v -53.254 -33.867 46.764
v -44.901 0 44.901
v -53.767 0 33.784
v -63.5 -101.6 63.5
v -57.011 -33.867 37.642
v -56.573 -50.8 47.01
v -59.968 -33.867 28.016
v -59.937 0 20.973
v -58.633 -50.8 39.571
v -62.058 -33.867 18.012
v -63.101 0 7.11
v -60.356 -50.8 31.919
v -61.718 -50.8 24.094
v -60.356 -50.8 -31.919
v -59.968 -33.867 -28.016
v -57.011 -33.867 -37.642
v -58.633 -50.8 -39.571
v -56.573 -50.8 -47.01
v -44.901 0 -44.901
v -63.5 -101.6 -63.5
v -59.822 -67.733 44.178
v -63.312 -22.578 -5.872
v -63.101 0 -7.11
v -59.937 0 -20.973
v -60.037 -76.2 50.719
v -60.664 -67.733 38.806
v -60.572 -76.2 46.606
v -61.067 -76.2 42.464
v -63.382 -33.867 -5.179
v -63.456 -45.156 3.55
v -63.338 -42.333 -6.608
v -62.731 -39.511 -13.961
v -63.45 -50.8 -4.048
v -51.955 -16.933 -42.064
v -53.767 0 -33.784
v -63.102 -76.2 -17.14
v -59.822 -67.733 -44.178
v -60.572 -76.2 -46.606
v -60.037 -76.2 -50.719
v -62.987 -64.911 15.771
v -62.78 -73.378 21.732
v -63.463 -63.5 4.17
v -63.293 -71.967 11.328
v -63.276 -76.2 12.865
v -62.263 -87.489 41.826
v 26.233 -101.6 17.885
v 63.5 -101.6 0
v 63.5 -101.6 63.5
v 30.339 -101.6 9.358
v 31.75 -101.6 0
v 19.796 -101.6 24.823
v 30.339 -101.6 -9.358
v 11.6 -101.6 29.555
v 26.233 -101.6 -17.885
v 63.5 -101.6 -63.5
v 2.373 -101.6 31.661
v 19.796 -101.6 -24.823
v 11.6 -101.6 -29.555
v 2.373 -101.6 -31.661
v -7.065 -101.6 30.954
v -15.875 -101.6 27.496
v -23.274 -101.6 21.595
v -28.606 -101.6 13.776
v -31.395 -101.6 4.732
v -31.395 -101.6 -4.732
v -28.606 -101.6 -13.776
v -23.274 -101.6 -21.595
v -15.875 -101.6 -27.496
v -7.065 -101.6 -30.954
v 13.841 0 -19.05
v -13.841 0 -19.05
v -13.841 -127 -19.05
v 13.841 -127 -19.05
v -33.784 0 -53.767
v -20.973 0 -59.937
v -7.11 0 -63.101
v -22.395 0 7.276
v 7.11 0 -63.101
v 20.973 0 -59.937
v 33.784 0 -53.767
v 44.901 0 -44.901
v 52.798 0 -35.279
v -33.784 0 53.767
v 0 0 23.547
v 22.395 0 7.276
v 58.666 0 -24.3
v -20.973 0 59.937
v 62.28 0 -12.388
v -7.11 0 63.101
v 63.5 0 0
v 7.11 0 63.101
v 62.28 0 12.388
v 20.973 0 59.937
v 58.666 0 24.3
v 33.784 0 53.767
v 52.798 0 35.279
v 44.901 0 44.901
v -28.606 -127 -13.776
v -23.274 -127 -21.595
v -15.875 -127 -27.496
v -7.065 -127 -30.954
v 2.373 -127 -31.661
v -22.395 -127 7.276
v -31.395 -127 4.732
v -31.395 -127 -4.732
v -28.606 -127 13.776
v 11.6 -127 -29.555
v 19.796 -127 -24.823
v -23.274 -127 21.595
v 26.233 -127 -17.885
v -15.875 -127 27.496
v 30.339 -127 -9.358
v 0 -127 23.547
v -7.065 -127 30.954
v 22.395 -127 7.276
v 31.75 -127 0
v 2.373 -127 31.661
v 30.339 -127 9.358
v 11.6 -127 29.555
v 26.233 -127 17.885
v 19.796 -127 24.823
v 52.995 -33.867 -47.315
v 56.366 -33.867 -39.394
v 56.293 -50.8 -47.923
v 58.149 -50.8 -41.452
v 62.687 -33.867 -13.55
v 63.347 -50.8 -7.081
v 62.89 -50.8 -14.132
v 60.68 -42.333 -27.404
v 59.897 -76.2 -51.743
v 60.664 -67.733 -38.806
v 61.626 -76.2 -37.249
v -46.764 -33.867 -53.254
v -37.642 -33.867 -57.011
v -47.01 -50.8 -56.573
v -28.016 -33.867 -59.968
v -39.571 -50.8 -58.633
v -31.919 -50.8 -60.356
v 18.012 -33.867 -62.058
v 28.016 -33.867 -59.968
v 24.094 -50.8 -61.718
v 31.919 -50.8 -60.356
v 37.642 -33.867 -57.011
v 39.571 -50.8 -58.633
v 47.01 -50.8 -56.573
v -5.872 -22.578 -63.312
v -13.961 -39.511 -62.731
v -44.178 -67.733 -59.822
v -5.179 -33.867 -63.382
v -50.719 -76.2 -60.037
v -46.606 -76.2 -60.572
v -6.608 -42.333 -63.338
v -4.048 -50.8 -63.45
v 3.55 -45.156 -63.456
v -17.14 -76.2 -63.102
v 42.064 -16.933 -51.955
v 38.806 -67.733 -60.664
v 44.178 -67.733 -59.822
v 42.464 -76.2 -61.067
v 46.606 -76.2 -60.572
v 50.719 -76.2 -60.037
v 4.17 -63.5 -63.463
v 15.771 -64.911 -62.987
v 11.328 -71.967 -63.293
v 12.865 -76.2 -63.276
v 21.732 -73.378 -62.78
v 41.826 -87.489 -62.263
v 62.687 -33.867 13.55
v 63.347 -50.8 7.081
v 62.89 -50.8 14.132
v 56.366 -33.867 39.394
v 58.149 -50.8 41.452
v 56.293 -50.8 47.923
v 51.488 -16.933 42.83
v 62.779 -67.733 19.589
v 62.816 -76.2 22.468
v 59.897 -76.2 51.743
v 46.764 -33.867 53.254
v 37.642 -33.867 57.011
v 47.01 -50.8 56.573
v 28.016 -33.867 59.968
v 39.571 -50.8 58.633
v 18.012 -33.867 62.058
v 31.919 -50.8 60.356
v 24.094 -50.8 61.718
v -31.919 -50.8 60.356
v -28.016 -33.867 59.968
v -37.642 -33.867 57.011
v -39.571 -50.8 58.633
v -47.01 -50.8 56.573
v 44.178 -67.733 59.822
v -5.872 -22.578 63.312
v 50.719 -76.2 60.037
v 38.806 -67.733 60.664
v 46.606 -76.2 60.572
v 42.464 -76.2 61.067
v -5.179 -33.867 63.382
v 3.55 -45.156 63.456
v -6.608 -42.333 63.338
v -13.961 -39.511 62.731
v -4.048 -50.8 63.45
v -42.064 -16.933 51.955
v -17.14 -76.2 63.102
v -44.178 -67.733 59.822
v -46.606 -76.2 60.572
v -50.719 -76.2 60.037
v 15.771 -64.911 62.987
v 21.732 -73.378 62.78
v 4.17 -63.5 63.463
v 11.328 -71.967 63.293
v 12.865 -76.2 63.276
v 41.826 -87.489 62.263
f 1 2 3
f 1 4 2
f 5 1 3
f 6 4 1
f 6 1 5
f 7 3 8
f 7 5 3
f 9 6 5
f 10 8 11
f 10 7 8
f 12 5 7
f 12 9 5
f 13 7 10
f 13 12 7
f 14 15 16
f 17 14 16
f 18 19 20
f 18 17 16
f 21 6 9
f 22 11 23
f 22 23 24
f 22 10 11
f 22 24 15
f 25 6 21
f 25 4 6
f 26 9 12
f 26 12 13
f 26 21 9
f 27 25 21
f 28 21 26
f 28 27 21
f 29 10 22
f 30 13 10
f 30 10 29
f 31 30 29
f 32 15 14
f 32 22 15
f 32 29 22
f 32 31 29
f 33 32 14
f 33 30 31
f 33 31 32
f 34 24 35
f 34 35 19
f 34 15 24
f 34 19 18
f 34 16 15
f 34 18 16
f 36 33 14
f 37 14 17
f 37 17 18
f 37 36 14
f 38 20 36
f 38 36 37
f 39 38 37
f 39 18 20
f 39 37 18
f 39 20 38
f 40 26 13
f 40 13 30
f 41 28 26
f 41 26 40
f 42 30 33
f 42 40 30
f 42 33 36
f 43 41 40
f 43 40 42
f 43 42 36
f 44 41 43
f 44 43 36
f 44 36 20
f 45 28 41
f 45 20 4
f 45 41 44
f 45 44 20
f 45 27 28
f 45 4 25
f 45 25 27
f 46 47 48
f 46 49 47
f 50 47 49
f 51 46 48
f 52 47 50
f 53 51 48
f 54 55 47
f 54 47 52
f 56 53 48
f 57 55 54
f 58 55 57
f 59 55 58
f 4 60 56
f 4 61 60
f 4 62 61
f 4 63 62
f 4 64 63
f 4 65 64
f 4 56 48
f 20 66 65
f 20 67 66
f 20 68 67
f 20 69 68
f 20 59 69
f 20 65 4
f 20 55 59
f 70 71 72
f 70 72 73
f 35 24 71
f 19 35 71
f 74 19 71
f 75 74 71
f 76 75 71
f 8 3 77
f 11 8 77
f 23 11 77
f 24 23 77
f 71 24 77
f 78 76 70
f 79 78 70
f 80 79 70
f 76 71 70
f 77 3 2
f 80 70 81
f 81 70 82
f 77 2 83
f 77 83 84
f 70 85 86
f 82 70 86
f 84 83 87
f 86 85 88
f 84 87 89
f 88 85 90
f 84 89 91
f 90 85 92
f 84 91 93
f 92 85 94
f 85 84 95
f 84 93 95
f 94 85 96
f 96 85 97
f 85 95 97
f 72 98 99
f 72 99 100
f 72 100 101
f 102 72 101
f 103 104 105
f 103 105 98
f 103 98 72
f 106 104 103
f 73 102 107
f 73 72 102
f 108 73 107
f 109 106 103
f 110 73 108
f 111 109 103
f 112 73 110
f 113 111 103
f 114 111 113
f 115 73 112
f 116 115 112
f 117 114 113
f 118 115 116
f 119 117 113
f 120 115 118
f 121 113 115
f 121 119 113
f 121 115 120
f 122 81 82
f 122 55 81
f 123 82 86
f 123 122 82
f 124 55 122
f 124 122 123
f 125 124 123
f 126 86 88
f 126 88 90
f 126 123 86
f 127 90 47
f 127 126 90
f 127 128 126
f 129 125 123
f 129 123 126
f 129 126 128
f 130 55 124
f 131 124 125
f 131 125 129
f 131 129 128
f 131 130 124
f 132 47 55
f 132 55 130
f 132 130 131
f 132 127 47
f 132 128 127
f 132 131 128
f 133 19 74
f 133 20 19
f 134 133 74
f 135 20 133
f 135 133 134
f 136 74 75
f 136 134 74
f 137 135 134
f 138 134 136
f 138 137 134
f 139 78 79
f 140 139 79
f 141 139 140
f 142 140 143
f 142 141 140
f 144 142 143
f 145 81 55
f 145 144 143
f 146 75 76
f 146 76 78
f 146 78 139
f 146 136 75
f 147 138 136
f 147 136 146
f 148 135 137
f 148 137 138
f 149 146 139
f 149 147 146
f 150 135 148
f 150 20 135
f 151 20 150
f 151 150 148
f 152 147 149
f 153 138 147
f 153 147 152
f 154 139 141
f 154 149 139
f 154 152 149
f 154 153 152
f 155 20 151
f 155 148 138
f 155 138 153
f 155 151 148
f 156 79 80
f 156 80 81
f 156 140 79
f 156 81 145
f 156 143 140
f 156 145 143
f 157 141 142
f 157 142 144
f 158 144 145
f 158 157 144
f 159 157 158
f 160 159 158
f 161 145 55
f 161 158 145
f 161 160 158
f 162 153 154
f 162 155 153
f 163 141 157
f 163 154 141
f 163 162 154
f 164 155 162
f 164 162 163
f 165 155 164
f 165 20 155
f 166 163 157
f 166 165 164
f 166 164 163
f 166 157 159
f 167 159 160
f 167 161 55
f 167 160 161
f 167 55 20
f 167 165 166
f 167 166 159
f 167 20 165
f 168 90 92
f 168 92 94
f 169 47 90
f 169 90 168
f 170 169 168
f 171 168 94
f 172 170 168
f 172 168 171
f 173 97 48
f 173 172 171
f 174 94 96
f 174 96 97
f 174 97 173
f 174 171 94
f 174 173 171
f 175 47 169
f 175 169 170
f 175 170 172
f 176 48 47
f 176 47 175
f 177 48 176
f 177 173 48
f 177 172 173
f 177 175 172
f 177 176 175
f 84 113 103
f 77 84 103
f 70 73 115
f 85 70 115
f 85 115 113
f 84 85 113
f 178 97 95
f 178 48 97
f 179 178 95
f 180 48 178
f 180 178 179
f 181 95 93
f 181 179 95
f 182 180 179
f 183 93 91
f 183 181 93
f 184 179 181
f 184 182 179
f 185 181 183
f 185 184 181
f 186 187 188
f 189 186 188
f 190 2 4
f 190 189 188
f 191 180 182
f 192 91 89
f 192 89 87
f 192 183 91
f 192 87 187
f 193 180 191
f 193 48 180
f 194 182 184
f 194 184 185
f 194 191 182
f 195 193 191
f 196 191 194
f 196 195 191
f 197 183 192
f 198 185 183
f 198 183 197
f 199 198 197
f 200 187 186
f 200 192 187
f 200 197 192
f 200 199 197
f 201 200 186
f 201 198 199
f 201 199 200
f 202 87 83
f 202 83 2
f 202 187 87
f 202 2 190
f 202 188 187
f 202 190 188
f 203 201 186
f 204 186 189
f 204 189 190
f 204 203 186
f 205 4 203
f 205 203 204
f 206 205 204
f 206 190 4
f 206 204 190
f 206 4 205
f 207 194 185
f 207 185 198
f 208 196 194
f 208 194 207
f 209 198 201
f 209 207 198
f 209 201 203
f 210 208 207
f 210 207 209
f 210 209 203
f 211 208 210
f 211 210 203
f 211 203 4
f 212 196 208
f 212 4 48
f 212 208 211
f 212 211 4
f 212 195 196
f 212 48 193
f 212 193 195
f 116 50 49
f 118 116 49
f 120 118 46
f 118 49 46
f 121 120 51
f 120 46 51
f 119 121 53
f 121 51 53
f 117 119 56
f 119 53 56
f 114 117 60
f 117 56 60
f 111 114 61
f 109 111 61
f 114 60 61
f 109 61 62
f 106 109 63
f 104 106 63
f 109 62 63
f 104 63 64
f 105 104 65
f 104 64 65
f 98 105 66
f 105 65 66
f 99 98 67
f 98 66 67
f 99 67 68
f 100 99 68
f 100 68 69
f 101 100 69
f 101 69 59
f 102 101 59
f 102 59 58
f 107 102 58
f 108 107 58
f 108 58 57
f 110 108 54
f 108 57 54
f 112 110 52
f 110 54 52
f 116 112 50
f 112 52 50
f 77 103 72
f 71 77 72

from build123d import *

# Parameters (mm, degrees)
F0_R     = 63.5
F2_W     = 127
F2_H     = 127
F4_R     = 31.75
F5_DEPTH = 25.4
F7_DEPTH = 127


with BuildPart() as f3:
    # F0 (on Front) → F3 section 0
    with BuildSketch(Plane.XZ):
        Circle(F0_R)
    # F2 (on offset) → F3 section 1
    with BuildSketch(Plane.XZ.offset(101.6)):
        Rectangle(F2_W, F2_H)
    loft()

    # F4 (on face) → F5 (join)
    with BuildSketch(Plane.XZ.offset(101.6)):
        Circle(F4_R)
    extrude(amount=F5_DEPTH)

    # F6 (on face) → F7 (cut)
    with BuildSketch(Plane.XZ.offset(127)):
        Polygon((-22.394618, 7.276453), (-13.840635, -19.05), (13.840635, -19.05), (22.394618, 7.276453), (0, 23.547095), align=None)
    extrude(amount=-F7_DEPTH, mode=Mode.SUBTRACT)


solid = f3.part
